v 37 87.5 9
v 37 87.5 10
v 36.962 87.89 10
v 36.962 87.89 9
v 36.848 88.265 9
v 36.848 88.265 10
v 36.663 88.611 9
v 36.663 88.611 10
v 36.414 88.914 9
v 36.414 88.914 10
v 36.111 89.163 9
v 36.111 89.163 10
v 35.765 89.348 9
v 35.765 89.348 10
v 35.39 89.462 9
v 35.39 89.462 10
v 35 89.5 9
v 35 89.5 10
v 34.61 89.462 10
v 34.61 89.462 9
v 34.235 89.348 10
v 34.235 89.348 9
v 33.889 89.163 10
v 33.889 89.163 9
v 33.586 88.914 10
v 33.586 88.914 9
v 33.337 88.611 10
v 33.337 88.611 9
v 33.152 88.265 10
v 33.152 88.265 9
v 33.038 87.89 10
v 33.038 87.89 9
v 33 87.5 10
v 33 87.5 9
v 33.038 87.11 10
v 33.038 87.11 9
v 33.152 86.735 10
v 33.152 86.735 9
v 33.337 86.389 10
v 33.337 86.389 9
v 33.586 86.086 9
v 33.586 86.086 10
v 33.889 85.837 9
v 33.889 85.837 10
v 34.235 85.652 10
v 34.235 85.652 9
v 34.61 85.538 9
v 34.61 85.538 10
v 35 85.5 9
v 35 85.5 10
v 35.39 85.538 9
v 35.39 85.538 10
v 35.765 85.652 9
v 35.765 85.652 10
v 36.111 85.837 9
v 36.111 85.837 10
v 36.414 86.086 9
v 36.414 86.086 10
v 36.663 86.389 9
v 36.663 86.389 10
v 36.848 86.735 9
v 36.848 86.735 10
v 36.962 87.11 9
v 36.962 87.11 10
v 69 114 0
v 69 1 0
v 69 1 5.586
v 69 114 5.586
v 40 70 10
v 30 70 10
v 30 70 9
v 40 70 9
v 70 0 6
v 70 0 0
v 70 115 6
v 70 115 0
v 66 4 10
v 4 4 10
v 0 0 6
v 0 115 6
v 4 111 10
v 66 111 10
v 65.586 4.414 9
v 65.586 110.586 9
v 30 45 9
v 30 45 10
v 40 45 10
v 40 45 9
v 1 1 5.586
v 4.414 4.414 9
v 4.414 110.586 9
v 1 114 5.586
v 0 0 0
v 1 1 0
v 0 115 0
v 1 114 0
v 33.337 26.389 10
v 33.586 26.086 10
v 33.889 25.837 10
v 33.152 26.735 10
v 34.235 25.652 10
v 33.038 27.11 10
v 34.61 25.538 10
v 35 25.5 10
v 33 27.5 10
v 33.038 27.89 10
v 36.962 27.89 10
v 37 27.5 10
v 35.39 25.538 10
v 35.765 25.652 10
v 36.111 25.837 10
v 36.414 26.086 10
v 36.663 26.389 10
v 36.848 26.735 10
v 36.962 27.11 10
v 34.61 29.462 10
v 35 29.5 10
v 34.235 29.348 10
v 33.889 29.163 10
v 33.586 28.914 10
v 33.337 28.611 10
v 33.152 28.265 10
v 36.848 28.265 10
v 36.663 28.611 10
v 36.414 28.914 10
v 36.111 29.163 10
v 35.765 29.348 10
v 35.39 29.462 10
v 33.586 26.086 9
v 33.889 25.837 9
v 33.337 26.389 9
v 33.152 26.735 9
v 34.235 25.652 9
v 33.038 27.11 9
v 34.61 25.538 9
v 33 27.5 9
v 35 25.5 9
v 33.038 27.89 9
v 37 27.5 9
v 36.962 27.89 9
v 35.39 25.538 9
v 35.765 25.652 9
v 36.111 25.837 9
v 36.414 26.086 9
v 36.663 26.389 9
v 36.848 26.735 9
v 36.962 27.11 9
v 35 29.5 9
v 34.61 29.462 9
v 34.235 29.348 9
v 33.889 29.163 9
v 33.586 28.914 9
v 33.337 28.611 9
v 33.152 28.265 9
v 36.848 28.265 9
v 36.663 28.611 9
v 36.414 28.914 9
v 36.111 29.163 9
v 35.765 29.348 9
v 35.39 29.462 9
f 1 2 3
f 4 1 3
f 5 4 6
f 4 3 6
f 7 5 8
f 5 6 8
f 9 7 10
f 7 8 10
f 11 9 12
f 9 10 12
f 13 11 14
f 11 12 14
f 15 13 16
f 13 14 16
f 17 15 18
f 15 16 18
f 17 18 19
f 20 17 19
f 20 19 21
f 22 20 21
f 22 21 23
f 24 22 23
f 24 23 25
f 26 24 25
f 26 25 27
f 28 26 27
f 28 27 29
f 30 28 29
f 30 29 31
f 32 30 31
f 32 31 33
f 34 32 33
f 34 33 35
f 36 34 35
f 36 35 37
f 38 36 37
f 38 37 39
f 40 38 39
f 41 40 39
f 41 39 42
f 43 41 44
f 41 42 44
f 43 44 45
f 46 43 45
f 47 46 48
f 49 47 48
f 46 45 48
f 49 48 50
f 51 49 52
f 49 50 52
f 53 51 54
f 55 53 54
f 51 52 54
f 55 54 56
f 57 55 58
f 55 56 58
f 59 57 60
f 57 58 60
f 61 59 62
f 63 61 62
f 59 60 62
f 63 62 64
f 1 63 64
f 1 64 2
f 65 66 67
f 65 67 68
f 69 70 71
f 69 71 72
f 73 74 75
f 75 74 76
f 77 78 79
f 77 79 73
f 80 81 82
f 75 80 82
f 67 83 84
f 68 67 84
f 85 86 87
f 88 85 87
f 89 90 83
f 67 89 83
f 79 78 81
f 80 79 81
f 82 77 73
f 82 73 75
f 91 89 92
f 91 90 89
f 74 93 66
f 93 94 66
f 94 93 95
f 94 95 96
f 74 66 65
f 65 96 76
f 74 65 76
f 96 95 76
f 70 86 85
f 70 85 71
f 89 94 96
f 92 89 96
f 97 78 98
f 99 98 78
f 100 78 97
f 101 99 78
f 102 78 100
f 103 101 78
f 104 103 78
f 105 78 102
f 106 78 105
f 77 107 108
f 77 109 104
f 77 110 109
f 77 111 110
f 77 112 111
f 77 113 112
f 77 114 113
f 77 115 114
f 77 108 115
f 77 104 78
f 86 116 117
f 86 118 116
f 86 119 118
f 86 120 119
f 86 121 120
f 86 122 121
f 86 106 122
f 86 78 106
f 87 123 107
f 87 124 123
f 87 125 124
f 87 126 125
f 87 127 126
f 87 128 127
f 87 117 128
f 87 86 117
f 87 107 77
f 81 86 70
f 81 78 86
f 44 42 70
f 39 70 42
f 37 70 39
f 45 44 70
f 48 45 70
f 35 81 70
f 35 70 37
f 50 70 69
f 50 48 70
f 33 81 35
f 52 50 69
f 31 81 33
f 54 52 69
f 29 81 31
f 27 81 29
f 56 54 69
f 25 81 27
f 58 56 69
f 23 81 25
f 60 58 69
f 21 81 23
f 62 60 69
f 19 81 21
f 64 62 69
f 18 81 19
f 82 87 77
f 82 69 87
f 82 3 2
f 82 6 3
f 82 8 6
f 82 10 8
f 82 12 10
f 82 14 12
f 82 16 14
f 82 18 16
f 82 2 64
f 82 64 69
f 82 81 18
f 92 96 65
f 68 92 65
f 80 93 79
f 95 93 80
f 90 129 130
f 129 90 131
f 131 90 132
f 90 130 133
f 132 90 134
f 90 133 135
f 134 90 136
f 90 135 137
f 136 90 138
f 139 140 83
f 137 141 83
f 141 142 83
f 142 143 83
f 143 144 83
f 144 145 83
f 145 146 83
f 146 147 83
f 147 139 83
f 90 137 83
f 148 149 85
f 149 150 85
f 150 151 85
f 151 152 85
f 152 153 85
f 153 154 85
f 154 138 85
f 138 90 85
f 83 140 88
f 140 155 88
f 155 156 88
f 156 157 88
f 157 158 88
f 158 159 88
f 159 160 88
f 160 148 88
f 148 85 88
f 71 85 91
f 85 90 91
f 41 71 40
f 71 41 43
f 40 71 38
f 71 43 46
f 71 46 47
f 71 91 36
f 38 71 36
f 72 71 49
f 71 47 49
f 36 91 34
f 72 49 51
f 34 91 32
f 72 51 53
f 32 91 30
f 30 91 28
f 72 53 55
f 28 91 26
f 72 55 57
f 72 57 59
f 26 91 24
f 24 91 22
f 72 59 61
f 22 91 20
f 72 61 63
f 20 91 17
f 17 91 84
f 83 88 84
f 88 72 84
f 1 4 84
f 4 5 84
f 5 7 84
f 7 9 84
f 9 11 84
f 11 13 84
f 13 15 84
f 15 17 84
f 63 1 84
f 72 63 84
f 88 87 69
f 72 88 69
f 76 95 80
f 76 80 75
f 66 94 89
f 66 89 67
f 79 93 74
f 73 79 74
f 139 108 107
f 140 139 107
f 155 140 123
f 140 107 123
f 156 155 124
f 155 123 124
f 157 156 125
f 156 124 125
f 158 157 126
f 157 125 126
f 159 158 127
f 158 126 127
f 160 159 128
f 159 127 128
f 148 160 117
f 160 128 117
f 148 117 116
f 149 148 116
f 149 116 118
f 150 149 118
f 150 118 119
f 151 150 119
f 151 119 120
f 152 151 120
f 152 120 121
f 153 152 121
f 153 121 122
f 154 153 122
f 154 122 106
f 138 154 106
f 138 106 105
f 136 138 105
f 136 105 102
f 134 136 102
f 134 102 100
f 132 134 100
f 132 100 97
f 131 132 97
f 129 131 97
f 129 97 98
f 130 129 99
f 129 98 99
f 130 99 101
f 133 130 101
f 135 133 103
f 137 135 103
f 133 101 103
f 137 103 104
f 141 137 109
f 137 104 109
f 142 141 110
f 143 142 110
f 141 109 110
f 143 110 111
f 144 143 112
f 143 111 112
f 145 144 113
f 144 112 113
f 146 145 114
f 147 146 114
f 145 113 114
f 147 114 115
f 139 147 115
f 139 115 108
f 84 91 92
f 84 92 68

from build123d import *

# Parameters (mm, degrees)
SKICA1_W                 = 70
SKICA1_H                 = 115
VYSUNOUT1_DEPTH          = 10
ZKOSIT1_SIZE             = 4
SKO_EPINA1_T             = -1
SKICA3_R                 = 2
SKICA3_W                 = 10
SKICA3_H                 = 25
ODEBRAT_VYSUNUT_M1_DEPTH = 11


with BuildPart() as part:
    # Skica1 → Vysunout1 (new body)
    with BuildSketch(Plane.XY):
        with Locations((35, 57.5)):
            Rectangle(SKICA1_W, SKICA1_H)
    extrude(amount=VYSUNOUT1_DEPTH)

    # Zkosit1
    zkosit1_edges = [part.edges().sort_by_distance(p)[0] for p in [
        (70, 57.5, 10),
        (35, 115, 10),
        (0, 57.5, 10),
        (35, 0, 10),
    ]]
    chamfer(zkosit1_edges, length=ZKOSIT1_SIZE)

    # Skořepina1
    sko_epina1_openings = [part.faces().sort_by_distance(p)[0] for p in [
        (35, 57.5, 0),
    ]]
    offset(amount=SKO_EPINA1_T, openings=sko_epina1_openings, kind=Kind.INTERSECTION)

    # Skica3 → Odebrat vysunutím1 (cut, through all)
    with BuildSketch(Plane.XY.offset(10)):
        with Locations((35, 87.5)):
            Circle(SKICA3_R)
        with Locations((35, 27.5)):
            Circle(SKICA3_R)
        with Locations((35, 57.5)):
            Rectangle(SKICA3_W, SKICA3_H)
    extrude(amount=-ODEBRAT_VYSUNUT_M1_DEPTH, mode=Mode.SUBTRACT)


solid = part.part
